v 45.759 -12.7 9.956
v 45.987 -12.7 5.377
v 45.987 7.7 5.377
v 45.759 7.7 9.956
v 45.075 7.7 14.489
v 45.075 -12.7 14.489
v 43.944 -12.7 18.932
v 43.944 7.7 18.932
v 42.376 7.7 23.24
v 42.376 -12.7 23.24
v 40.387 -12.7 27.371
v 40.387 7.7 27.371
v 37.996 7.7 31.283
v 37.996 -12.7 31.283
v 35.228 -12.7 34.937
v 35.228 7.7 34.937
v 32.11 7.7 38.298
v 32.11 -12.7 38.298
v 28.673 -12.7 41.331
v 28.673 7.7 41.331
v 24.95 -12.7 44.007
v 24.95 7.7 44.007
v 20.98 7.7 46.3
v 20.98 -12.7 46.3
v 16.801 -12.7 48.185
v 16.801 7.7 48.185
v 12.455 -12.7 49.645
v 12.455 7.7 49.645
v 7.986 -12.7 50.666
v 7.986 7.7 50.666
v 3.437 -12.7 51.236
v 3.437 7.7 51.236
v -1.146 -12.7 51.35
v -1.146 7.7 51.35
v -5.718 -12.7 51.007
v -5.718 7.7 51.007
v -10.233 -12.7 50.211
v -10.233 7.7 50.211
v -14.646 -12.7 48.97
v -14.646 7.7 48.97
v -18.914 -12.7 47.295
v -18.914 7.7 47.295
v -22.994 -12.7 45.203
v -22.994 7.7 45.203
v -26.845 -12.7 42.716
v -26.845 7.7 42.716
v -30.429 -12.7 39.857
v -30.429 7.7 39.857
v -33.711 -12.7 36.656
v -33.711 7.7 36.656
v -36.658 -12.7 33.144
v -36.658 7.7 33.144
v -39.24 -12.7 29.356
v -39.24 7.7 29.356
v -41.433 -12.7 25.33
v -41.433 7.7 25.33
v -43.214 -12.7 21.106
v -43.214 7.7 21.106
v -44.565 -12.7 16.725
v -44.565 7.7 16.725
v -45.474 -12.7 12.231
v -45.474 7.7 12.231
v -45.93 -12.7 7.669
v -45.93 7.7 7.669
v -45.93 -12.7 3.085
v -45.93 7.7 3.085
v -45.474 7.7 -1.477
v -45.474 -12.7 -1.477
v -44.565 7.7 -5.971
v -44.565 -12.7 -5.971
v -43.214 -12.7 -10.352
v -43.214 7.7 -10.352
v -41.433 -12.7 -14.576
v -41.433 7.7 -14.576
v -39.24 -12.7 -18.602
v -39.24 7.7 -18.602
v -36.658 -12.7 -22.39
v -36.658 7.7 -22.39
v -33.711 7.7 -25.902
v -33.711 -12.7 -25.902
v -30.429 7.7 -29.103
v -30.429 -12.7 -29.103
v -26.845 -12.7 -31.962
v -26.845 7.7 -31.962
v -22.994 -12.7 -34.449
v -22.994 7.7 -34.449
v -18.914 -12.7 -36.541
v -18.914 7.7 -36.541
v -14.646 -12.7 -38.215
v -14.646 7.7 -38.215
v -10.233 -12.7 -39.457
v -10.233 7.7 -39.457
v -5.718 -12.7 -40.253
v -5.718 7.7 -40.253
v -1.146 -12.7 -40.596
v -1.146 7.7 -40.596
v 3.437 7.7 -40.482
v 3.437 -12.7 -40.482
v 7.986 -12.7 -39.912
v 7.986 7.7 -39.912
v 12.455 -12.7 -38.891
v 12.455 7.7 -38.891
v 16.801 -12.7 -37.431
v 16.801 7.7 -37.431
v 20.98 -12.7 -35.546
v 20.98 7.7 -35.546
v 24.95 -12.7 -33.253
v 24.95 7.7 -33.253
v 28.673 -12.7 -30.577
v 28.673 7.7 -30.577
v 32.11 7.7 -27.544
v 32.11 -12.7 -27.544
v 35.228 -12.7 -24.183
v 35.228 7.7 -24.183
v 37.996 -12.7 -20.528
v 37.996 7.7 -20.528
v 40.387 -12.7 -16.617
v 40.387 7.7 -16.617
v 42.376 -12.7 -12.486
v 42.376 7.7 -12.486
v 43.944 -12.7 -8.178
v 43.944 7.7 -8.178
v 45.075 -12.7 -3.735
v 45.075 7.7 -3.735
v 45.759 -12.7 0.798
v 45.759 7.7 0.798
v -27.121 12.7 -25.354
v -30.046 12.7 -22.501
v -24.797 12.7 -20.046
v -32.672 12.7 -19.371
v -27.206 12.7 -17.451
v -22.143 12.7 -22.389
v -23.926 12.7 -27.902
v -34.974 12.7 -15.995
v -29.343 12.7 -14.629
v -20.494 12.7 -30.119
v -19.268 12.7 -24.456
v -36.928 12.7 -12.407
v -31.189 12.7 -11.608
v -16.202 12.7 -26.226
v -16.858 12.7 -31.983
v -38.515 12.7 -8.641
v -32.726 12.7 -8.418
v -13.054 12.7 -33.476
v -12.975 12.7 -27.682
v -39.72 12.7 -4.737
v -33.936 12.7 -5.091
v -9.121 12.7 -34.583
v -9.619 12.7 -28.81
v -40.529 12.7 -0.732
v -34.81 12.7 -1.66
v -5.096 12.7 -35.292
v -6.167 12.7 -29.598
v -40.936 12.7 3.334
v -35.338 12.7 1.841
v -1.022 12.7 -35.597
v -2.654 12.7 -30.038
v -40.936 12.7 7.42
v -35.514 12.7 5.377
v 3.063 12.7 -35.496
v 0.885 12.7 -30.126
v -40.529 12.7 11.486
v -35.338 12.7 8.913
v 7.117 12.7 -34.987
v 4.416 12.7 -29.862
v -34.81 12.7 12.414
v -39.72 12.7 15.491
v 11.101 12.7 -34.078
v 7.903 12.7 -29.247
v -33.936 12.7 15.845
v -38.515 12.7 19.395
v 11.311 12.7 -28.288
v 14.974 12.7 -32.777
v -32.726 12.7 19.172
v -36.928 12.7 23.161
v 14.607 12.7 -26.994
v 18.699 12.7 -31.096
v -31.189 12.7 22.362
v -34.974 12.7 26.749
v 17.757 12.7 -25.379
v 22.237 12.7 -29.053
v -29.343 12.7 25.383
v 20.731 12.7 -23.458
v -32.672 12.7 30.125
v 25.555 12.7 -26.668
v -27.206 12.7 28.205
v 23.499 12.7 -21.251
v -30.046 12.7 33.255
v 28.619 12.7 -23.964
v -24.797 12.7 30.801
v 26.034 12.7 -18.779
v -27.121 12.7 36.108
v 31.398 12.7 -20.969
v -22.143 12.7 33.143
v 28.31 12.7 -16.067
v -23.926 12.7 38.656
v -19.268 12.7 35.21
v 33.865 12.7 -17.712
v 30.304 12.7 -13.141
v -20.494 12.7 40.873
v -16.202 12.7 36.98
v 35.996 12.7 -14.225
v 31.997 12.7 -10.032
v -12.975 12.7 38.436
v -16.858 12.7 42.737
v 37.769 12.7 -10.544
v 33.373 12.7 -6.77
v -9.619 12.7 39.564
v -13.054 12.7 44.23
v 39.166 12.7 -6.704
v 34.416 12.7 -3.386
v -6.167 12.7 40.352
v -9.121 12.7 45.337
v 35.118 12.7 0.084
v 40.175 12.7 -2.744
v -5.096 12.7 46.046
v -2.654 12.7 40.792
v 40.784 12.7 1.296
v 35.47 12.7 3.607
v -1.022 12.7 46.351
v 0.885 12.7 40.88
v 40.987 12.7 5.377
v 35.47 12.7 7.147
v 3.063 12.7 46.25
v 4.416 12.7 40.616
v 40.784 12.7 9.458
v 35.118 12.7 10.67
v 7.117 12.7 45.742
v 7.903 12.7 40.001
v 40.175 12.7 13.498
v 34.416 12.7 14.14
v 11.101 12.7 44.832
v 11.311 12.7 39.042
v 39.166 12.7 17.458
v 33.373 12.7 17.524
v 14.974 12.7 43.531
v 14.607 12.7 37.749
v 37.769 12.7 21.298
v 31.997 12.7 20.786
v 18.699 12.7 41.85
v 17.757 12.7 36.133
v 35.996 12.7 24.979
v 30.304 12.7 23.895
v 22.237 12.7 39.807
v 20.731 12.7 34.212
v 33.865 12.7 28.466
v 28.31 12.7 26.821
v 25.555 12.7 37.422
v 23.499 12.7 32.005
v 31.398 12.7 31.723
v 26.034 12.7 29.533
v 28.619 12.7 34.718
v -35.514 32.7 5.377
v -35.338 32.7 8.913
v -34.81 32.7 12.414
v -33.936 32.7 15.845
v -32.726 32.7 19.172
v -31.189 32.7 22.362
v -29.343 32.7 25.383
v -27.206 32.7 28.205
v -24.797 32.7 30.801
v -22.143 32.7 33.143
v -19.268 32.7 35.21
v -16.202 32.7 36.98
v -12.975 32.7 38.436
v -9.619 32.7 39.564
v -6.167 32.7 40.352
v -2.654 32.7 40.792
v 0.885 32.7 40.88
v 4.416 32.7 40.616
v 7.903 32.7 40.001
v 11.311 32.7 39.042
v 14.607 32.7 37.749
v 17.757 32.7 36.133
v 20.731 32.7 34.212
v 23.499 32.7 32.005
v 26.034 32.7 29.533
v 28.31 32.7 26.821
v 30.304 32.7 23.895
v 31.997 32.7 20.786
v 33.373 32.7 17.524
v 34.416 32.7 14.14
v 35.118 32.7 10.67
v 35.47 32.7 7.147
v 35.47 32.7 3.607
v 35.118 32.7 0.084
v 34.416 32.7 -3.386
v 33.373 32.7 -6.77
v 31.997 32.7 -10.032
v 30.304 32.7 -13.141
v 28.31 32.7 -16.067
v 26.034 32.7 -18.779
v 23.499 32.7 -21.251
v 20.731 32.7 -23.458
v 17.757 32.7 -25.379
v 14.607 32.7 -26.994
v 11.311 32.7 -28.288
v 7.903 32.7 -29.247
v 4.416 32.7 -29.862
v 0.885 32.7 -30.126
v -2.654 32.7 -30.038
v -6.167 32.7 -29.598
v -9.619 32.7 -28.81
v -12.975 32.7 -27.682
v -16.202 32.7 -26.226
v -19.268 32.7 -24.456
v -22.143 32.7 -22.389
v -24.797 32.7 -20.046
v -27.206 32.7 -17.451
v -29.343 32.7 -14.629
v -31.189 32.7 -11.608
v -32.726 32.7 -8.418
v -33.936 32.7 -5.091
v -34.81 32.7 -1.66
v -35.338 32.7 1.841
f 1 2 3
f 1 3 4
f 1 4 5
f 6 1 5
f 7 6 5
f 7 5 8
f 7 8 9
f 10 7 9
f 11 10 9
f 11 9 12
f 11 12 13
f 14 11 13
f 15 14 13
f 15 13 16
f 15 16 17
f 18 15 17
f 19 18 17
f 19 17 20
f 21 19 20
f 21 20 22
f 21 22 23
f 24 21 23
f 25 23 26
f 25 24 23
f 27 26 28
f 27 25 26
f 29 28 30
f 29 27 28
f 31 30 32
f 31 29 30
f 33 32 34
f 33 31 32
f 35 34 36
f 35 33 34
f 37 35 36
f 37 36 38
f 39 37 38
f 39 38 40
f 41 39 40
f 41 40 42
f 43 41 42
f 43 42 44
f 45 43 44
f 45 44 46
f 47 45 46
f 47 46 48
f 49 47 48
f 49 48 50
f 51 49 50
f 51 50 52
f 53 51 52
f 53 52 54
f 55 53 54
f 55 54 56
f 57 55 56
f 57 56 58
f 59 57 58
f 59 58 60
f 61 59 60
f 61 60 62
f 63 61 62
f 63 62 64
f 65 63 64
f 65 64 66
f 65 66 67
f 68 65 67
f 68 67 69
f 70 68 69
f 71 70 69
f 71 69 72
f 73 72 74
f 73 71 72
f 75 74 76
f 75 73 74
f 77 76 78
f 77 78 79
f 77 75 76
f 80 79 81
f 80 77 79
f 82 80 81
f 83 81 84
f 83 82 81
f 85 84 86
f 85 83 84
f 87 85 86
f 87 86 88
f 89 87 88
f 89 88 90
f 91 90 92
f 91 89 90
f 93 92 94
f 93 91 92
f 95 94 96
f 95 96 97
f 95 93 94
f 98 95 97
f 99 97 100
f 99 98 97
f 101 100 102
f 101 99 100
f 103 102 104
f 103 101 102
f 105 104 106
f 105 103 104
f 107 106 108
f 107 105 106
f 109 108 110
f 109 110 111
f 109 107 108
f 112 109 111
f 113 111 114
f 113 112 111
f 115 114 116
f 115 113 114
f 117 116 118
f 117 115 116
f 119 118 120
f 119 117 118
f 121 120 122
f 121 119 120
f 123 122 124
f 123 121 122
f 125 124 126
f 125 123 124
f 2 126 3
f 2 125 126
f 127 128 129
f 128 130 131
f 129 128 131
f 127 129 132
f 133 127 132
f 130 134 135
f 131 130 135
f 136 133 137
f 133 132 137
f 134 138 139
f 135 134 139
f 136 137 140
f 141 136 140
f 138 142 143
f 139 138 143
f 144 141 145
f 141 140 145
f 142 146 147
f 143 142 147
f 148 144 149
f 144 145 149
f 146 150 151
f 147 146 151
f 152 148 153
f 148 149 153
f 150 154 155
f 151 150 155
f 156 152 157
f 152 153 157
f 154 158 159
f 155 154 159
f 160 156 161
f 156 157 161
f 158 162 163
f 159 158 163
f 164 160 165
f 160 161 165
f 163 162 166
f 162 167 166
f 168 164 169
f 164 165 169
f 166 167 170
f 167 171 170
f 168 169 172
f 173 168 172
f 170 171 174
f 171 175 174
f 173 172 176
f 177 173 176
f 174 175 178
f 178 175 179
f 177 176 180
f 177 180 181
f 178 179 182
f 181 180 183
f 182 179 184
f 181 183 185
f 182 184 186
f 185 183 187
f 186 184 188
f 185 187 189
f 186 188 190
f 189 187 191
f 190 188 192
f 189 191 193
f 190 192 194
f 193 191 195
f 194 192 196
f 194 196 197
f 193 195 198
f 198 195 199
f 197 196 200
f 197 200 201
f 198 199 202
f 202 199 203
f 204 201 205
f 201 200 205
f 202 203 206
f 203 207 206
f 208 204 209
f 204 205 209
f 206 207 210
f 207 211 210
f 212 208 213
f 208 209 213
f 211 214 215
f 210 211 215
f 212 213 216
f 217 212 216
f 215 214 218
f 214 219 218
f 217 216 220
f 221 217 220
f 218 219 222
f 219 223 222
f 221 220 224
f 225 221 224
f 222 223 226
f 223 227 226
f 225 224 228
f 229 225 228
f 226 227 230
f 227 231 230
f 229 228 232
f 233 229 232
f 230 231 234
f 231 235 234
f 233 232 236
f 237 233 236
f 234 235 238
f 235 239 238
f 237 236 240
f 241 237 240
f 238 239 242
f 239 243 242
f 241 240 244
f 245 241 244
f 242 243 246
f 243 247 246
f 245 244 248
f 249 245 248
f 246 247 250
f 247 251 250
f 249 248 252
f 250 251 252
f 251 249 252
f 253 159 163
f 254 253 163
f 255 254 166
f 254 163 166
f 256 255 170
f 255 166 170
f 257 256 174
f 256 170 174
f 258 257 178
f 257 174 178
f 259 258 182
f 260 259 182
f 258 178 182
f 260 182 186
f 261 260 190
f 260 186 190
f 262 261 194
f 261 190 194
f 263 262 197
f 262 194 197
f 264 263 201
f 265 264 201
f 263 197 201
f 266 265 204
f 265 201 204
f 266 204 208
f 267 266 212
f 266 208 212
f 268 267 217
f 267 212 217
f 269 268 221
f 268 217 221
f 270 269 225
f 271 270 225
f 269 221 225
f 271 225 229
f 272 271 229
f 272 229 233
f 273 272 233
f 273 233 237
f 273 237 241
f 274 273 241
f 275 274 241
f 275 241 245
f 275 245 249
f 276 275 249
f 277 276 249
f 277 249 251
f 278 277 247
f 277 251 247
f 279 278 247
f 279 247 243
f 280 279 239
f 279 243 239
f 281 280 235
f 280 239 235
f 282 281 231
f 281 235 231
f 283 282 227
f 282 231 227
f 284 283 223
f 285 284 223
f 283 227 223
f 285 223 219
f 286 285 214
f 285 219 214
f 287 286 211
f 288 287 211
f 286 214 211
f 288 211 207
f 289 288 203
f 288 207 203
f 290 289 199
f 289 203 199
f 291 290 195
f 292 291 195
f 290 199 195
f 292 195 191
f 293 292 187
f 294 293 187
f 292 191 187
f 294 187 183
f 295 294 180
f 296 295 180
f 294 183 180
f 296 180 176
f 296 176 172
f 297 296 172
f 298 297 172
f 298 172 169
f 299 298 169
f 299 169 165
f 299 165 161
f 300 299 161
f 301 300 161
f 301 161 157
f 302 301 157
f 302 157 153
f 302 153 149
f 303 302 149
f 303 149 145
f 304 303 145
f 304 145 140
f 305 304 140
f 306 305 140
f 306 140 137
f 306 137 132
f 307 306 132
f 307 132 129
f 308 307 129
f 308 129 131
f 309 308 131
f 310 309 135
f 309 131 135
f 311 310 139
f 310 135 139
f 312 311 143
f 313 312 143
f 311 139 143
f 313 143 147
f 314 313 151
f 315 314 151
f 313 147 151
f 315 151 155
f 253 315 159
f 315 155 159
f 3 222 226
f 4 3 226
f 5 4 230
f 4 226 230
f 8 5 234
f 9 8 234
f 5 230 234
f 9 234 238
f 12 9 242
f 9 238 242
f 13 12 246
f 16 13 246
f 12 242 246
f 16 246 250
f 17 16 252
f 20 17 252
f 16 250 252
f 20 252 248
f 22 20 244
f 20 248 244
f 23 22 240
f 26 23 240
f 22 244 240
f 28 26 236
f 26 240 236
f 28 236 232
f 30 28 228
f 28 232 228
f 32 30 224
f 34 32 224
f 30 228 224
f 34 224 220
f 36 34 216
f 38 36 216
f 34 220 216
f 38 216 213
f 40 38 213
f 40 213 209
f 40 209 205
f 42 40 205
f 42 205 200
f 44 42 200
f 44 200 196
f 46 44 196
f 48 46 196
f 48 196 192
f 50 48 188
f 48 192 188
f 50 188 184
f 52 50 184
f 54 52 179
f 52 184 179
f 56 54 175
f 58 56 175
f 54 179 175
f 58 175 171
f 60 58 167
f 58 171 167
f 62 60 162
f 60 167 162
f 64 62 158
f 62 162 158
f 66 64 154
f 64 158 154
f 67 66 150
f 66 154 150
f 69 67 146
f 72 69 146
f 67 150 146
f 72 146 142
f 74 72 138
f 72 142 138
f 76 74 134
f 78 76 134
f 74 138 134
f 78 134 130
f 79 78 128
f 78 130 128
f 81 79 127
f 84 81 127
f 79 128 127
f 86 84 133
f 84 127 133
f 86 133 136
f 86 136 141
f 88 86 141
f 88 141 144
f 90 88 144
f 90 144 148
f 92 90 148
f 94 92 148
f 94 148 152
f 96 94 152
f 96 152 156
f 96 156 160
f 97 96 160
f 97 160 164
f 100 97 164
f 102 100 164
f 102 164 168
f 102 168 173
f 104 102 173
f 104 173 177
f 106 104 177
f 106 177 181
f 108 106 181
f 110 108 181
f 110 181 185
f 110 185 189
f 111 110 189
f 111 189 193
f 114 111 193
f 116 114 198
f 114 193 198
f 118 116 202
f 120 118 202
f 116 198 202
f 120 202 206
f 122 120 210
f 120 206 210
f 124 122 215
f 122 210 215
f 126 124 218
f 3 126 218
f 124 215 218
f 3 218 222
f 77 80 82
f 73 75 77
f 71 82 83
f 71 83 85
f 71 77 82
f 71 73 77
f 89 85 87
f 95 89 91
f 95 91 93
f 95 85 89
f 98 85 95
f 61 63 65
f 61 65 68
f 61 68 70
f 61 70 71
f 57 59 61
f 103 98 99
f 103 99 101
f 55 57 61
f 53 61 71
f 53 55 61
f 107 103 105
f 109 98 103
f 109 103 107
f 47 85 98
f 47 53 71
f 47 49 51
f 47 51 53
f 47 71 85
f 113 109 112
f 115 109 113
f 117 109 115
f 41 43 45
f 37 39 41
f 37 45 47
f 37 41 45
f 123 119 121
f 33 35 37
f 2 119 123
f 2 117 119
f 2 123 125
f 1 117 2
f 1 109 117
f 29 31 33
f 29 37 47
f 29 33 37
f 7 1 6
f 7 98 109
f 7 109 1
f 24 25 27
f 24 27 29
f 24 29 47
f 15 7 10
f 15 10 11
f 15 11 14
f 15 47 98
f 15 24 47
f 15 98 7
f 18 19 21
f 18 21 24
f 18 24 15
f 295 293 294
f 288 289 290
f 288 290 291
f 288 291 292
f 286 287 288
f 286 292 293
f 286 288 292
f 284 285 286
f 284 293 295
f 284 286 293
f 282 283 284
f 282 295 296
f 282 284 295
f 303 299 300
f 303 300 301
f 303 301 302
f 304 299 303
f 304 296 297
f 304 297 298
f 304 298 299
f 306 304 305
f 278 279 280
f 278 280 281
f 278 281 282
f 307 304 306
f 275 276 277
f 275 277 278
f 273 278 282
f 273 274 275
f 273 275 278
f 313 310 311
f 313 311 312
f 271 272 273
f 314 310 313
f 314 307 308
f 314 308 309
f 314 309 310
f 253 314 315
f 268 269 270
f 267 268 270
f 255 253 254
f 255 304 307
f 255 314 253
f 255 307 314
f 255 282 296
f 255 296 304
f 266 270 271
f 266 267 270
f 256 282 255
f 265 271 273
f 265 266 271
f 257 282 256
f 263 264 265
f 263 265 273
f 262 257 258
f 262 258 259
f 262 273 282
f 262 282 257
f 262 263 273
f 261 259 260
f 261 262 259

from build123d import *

# Parameters (mm, degrees)
F0_R     = 45.9871931788
F1_DEPTH = 12.7
F4_R     = 35.5142998493
F5_DEPTH = 20
F6_SIZE  = 5


# Not quite as in the source:
# - the program builds the solid bodies; features that only make, move or delete a surface that nothing else refers to are left out


with BuildPart() as f1:
    # F0 (on Front) → F1 (new body, symmetric)
    with BuildSketch(Plane.XZ):
        with Locations((0, 5.3770393133)):
            Circle(F0_R)
    extrude(amount=F1_DEPTH, both=True)

    # F4 (on face) → F5 (join)
    with BuildSketch(Plane(origin=(0, 12.7, 0), x_dir=(-1, 0, 0), z_dir=(0, 1, 0))):
        with Locations((0, 5.3770393133)):
            Circle(F4_R)
    extrude(amount=F5_DEPTH)

    # F6
    f6_edges = [f1.edges().sort_by_distance(p)[0] for p in [
        (-45.987193, 12.7, 5.377039),
    ]]
    chamfer(f6_edges, length=F6_SIZE)


solid = f1.part
